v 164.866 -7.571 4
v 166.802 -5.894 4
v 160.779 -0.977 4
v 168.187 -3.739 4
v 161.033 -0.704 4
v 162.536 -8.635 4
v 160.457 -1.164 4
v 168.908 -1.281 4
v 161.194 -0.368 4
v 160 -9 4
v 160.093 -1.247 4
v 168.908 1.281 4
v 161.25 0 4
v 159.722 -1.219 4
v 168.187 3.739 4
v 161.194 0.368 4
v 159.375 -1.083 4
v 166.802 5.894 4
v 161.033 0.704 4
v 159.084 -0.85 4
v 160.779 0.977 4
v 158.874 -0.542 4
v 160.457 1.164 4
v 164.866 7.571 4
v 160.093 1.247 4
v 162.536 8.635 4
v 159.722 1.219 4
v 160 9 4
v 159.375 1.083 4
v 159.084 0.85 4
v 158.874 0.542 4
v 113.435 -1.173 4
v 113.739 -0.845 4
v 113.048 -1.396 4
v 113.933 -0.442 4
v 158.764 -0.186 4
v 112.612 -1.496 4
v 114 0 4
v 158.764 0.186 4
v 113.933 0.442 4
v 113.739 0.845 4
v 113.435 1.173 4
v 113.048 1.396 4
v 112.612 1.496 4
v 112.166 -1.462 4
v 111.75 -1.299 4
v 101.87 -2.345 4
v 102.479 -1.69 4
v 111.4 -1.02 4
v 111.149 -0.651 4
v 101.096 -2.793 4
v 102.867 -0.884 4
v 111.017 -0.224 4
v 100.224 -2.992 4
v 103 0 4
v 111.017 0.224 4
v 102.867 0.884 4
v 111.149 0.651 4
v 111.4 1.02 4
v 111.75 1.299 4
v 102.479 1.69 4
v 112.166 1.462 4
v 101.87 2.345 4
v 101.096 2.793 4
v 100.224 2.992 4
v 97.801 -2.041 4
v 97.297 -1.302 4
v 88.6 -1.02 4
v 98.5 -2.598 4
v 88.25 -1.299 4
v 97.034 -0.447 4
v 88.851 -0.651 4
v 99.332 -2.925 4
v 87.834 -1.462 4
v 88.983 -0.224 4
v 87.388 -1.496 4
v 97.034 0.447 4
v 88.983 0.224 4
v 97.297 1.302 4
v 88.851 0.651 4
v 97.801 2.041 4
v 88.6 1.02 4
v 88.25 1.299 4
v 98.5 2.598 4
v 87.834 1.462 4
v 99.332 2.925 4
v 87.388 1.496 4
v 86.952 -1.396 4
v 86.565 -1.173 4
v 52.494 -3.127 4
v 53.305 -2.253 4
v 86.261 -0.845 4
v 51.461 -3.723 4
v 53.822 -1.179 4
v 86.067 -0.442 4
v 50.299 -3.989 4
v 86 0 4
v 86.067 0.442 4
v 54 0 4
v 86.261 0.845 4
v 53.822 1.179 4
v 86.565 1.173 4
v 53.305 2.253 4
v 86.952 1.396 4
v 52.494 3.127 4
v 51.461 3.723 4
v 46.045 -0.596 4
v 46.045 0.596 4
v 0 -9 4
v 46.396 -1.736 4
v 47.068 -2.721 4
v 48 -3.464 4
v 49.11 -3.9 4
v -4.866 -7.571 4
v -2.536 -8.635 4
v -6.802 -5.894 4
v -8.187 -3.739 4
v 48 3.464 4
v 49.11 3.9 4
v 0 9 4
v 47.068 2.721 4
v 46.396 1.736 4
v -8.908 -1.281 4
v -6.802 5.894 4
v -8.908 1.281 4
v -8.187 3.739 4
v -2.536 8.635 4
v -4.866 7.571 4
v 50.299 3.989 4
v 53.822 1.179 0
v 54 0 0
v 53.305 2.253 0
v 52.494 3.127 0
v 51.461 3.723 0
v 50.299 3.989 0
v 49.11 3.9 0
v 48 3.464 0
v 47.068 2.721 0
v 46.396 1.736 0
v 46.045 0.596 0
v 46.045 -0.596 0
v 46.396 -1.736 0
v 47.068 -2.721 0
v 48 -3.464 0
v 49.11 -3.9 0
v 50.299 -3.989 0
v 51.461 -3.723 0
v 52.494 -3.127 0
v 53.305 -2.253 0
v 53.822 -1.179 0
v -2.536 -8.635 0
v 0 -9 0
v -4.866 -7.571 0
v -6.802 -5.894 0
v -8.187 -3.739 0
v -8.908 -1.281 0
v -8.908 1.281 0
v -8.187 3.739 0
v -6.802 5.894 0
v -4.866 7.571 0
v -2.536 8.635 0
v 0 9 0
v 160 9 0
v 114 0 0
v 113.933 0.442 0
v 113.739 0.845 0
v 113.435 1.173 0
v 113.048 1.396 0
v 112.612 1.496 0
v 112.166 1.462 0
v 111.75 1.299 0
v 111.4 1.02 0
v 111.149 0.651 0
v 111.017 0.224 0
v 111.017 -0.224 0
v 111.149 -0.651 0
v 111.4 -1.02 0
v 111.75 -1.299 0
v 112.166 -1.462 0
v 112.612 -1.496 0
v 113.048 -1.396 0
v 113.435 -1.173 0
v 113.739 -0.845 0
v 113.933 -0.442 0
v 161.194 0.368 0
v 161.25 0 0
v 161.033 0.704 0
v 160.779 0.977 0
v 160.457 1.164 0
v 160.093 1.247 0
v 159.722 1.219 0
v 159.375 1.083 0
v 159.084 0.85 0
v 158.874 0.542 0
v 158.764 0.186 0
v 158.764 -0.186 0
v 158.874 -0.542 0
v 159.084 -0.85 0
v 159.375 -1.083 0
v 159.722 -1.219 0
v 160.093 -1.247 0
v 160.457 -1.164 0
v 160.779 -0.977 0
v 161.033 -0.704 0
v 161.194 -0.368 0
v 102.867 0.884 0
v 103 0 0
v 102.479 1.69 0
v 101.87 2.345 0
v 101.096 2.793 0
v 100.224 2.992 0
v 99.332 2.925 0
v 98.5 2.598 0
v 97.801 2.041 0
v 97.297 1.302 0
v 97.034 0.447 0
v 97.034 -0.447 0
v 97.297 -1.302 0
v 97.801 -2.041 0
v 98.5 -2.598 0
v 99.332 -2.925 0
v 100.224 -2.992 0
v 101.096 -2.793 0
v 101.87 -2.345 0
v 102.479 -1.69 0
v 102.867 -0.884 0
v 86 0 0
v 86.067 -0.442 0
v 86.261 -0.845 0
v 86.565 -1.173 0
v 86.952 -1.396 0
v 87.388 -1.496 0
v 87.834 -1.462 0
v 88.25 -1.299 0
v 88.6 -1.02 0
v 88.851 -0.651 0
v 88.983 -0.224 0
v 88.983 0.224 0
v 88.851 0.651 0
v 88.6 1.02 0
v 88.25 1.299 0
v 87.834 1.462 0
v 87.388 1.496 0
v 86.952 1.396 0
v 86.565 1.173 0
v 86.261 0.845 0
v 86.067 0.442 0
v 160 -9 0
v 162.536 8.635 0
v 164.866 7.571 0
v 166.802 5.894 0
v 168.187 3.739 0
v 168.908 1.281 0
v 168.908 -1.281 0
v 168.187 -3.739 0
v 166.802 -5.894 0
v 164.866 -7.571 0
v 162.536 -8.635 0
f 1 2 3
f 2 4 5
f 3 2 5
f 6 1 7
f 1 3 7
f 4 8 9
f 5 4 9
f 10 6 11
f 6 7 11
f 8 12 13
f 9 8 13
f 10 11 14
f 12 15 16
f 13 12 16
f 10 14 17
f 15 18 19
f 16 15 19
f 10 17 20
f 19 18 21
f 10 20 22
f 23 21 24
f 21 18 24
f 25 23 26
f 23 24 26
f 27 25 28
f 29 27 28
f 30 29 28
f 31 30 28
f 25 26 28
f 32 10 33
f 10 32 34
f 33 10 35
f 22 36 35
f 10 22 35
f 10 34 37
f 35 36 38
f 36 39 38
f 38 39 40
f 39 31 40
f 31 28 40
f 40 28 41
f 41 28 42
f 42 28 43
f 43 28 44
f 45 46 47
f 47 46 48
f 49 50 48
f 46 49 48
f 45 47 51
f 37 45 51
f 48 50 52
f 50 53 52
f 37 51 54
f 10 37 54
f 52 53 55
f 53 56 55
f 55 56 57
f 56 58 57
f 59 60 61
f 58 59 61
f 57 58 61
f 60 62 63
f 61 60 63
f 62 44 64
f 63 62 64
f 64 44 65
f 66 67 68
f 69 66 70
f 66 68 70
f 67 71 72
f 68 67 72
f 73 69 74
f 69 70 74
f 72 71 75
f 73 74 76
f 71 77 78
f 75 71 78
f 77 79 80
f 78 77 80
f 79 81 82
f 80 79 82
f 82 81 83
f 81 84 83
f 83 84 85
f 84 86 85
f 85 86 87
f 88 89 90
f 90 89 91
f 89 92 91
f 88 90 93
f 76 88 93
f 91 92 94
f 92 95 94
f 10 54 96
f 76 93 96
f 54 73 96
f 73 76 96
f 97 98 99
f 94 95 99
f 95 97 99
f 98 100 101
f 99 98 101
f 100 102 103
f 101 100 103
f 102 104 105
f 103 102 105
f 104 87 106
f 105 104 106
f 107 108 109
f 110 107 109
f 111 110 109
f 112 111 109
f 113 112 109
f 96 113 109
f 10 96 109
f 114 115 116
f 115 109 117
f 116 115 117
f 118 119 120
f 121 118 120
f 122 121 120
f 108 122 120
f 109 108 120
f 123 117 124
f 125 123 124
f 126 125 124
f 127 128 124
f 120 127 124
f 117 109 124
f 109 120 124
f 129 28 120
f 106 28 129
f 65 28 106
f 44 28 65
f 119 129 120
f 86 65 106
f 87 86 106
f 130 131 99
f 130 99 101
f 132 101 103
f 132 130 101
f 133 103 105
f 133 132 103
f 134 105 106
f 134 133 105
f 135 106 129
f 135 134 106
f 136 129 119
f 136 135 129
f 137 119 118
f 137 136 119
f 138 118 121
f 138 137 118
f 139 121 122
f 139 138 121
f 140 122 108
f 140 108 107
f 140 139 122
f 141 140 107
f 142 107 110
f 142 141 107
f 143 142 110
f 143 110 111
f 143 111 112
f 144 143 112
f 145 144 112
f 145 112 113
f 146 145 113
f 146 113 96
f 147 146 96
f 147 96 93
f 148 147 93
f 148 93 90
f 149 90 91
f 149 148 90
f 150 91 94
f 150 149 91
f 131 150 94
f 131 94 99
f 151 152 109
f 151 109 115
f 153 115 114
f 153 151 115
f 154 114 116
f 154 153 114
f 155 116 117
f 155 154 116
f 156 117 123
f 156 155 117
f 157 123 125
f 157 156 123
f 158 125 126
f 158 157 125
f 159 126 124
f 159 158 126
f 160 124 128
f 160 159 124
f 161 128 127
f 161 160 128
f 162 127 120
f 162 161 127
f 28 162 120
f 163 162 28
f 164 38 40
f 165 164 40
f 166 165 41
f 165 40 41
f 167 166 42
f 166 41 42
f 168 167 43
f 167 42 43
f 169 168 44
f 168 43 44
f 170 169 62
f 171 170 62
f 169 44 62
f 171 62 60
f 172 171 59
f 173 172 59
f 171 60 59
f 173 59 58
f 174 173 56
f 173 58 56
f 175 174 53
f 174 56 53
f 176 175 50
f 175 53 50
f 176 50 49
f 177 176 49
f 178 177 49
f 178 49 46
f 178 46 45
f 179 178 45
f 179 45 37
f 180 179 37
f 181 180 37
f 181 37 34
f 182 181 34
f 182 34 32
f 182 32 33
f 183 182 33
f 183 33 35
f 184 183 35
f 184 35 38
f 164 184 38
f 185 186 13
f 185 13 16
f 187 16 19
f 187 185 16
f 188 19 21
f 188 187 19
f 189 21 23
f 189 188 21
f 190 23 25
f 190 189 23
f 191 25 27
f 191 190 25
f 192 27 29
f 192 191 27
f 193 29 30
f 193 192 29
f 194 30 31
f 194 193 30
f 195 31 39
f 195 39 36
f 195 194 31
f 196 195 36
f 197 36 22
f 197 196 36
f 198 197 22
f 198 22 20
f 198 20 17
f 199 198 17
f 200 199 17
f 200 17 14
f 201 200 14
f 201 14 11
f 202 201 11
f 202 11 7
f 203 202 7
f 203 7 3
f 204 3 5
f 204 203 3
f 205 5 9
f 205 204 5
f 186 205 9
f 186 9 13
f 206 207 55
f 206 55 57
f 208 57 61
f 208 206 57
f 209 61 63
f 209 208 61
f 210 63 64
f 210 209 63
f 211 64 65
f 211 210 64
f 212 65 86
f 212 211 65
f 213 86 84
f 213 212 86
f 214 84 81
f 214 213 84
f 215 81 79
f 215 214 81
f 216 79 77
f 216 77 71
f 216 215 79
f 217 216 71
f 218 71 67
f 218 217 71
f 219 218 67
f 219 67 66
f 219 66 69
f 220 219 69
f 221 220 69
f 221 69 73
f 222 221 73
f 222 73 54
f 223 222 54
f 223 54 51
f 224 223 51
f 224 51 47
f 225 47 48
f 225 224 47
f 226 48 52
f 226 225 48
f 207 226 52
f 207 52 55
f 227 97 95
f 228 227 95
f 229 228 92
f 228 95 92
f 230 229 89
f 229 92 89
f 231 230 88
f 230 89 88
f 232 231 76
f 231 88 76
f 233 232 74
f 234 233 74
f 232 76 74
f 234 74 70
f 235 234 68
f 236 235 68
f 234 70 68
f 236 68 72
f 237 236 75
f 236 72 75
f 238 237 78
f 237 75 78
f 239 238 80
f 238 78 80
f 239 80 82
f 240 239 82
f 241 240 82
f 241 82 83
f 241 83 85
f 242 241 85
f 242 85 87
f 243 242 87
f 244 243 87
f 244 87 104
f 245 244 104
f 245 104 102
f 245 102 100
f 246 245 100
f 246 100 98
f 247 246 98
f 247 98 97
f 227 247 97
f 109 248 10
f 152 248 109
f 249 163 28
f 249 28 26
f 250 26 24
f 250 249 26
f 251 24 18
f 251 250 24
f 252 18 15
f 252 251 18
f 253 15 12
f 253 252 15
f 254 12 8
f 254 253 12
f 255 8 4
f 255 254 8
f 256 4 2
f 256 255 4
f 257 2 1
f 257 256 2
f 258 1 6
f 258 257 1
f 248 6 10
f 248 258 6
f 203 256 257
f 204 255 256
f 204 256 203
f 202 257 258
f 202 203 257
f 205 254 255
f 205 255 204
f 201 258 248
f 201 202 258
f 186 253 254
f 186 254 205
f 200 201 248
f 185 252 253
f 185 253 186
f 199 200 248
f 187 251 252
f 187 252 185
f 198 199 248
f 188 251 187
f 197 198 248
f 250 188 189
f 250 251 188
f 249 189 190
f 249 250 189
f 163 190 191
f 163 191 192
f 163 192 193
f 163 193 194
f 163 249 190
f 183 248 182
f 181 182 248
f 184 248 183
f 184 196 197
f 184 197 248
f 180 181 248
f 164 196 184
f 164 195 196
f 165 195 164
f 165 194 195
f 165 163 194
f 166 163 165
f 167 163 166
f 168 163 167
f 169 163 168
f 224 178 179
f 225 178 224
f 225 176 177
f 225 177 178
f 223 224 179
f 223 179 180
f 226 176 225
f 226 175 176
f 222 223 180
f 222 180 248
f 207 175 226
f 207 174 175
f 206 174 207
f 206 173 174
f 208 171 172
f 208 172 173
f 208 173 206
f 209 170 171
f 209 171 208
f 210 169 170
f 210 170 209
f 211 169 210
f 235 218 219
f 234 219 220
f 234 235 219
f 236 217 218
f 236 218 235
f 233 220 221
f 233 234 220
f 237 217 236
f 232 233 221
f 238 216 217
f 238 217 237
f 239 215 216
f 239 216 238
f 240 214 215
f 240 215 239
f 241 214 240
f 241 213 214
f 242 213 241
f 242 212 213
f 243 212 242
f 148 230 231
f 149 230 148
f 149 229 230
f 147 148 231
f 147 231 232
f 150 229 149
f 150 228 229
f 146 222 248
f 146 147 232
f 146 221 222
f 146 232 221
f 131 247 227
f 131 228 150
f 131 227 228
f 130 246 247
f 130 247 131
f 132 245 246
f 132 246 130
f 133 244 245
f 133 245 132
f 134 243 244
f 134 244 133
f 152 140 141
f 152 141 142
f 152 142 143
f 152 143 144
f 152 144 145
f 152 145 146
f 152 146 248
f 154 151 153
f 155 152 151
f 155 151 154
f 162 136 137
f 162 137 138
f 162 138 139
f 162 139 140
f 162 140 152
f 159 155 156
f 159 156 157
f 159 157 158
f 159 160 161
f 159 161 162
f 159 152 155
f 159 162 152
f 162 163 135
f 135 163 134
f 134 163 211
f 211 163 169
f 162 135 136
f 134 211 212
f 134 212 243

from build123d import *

# Parameters (mm, degrees)
SKETCH_1_R          = 1.25
SKETCH_1_R_2        = 3
SKETCH_1_R_3        = 4
EXTRUDE_1_DEPTH     = 4
SKETCH_2_R          = 1.5
CUT_EXTRUDE_1_DEPTH = 170.286738996


with BuildPart() as part:
    # ｽｹｯﾁ1 → ﾎﾞｽ - 押し出し1 (new body)
    with BuildSketch(Plane.XY):
        with BuildLine():
            Line((0, 9), (160, 9))
            ThreePointArc((160, 9), (169, 0), (160, -9))
            Line((160, -9), (0, -9))
            ThreePointArc((0, -9), (-9, 0), (0, 9))
        make_face()
        with Locations((160, 0)):
            Circle(SKETCH_1_R, mode=Mode.SUBTRACT)
        with Locations((100, 0)):
            Circle(SKETCH_1_R_2, mode=Mode.SUBTRACT)
        with Locations((50, 0)):
            Circle(SKETCH_1_R_3, mode=Mode.SUBTRACT)
    extrude(amount=EXTRUDE_1_DEPTH)

    # ｽｹｯﾁ2 → ｶｯﾄ - 押し出し1 (cut, through all)
    with BuildSketch(Plane.XY.offset(4)):
        with Locations((112.5, 0)):
            Circle(SKETCH_2_R)
        with Locations(Location((87.5, 0, 0), (0, 0, 180))):
            Circle(SKETCH_2_R)
    extrude(amount=-CUT_EXTRUDE_1_DEPTH, mode=Mode.SUBTRACT)


solid = part.part
